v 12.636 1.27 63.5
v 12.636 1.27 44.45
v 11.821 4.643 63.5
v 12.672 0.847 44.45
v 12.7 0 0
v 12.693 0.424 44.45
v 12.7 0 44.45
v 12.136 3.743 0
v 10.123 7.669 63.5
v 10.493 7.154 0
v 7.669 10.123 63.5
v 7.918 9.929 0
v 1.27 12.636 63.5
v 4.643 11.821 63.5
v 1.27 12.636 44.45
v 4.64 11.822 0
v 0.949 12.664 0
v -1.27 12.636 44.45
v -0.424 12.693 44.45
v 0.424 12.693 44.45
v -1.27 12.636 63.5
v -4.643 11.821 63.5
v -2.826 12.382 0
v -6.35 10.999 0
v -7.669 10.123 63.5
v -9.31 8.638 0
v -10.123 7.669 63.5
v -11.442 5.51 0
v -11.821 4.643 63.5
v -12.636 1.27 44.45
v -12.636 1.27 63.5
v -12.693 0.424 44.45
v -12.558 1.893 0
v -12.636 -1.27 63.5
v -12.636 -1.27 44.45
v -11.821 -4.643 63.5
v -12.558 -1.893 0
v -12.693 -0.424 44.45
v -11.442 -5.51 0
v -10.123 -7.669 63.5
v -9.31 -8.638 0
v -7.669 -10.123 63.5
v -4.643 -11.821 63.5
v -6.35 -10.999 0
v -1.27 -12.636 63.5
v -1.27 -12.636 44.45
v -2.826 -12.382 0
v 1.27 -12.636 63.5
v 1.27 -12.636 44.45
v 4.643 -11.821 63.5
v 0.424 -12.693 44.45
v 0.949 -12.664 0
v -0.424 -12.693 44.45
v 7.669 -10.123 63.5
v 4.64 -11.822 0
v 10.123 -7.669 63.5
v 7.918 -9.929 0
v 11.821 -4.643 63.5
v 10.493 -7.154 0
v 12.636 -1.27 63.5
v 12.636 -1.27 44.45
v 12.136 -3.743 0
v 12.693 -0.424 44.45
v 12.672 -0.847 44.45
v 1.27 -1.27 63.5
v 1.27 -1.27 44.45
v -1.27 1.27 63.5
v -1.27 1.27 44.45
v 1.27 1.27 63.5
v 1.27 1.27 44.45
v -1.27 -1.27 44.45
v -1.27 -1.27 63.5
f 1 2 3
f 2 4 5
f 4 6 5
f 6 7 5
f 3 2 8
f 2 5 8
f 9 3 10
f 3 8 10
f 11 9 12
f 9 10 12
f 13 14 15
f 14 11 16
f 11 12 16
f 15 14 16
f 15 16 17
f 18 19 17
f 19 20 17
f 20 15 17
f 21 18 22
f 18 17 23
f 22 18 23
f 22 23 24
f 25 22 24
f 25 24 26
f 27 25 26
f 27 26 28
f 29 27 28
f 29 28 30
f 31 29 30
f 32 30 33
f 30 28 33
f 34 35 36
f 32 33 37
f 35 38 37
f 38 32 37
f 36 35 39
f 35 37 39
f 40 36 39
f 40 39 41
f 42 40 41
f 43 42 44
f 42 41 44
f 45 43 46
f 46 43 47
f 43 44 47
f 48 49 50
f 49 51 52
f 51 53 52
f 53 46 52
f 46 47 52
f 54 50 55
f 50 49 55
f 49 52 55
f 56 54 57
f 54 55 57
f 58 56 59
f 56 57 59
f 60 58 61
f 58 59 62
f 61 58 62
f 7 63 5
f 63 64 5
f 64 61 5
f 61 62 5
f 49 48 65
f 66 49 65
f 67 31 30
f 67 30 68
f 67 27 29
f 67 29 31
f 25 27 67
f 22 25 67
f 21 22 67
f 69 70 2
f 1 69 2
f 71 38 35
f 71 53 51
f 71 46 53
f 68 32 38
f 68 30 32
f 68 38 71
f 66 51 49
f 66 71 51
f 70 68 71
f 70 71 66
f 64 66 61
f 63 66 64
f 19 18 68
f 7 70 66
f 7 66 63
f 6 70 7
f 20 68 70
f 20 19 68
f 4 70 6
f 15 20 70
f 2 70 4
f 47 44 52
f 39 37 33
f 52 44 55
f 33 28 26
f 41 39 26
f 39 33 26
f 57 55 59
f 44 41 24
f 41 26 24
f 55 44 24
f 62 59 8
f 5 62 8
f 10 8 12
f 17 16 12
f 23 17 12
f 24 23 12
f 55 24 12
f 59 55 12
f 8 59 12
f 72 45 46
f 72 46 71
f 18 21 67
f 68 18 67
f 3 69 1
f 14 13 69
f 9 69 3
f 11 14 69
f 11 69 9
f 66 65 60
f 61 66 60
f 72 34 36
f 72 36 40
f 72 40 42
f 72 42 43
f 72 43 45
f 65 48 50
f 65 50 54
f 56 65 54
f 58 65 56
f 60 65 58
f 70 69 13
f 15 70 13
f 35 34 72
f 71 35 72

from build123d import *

# Parameters (mm, degrees)
F0_R     = 12.7
F1_DEPTH = 63.5
F2_W     = 2.54
F2_H     = 11.43
F2_H_2   = 2.54
F2_W_2   = 11.43
F3_DEPTH = 19.05


with BuildPart() as f1:
    # F0 (on Top) → F1 (new body)
    with BuildSketch(Plane.XY):
        Circle(F0_R)
    extrude(amount=F1_DEPTH)

    # F2 (on face) → F3 (cut)
    with BuildSketch(Plane.XY.offset(63.5)):
        with Locations((0, 6.985)):
            Rectangle(F2_W, F2_H)
        Rectangle(F2_W, F2_H_2)
        with Locations((-6.985, 0)):
            Rectangle(F2_W_2, F2_H_2)
        with Locations((6.985, 0)):
            Rectangle(F2_W_2, F2_H_2)
        with Locations((0, -6.985)):
            Rectangle(F2_W, F2_H)
    extrude(amount=-F3_DEPTH, mode=Mode.SUBTRACT)


solid = f1.part
